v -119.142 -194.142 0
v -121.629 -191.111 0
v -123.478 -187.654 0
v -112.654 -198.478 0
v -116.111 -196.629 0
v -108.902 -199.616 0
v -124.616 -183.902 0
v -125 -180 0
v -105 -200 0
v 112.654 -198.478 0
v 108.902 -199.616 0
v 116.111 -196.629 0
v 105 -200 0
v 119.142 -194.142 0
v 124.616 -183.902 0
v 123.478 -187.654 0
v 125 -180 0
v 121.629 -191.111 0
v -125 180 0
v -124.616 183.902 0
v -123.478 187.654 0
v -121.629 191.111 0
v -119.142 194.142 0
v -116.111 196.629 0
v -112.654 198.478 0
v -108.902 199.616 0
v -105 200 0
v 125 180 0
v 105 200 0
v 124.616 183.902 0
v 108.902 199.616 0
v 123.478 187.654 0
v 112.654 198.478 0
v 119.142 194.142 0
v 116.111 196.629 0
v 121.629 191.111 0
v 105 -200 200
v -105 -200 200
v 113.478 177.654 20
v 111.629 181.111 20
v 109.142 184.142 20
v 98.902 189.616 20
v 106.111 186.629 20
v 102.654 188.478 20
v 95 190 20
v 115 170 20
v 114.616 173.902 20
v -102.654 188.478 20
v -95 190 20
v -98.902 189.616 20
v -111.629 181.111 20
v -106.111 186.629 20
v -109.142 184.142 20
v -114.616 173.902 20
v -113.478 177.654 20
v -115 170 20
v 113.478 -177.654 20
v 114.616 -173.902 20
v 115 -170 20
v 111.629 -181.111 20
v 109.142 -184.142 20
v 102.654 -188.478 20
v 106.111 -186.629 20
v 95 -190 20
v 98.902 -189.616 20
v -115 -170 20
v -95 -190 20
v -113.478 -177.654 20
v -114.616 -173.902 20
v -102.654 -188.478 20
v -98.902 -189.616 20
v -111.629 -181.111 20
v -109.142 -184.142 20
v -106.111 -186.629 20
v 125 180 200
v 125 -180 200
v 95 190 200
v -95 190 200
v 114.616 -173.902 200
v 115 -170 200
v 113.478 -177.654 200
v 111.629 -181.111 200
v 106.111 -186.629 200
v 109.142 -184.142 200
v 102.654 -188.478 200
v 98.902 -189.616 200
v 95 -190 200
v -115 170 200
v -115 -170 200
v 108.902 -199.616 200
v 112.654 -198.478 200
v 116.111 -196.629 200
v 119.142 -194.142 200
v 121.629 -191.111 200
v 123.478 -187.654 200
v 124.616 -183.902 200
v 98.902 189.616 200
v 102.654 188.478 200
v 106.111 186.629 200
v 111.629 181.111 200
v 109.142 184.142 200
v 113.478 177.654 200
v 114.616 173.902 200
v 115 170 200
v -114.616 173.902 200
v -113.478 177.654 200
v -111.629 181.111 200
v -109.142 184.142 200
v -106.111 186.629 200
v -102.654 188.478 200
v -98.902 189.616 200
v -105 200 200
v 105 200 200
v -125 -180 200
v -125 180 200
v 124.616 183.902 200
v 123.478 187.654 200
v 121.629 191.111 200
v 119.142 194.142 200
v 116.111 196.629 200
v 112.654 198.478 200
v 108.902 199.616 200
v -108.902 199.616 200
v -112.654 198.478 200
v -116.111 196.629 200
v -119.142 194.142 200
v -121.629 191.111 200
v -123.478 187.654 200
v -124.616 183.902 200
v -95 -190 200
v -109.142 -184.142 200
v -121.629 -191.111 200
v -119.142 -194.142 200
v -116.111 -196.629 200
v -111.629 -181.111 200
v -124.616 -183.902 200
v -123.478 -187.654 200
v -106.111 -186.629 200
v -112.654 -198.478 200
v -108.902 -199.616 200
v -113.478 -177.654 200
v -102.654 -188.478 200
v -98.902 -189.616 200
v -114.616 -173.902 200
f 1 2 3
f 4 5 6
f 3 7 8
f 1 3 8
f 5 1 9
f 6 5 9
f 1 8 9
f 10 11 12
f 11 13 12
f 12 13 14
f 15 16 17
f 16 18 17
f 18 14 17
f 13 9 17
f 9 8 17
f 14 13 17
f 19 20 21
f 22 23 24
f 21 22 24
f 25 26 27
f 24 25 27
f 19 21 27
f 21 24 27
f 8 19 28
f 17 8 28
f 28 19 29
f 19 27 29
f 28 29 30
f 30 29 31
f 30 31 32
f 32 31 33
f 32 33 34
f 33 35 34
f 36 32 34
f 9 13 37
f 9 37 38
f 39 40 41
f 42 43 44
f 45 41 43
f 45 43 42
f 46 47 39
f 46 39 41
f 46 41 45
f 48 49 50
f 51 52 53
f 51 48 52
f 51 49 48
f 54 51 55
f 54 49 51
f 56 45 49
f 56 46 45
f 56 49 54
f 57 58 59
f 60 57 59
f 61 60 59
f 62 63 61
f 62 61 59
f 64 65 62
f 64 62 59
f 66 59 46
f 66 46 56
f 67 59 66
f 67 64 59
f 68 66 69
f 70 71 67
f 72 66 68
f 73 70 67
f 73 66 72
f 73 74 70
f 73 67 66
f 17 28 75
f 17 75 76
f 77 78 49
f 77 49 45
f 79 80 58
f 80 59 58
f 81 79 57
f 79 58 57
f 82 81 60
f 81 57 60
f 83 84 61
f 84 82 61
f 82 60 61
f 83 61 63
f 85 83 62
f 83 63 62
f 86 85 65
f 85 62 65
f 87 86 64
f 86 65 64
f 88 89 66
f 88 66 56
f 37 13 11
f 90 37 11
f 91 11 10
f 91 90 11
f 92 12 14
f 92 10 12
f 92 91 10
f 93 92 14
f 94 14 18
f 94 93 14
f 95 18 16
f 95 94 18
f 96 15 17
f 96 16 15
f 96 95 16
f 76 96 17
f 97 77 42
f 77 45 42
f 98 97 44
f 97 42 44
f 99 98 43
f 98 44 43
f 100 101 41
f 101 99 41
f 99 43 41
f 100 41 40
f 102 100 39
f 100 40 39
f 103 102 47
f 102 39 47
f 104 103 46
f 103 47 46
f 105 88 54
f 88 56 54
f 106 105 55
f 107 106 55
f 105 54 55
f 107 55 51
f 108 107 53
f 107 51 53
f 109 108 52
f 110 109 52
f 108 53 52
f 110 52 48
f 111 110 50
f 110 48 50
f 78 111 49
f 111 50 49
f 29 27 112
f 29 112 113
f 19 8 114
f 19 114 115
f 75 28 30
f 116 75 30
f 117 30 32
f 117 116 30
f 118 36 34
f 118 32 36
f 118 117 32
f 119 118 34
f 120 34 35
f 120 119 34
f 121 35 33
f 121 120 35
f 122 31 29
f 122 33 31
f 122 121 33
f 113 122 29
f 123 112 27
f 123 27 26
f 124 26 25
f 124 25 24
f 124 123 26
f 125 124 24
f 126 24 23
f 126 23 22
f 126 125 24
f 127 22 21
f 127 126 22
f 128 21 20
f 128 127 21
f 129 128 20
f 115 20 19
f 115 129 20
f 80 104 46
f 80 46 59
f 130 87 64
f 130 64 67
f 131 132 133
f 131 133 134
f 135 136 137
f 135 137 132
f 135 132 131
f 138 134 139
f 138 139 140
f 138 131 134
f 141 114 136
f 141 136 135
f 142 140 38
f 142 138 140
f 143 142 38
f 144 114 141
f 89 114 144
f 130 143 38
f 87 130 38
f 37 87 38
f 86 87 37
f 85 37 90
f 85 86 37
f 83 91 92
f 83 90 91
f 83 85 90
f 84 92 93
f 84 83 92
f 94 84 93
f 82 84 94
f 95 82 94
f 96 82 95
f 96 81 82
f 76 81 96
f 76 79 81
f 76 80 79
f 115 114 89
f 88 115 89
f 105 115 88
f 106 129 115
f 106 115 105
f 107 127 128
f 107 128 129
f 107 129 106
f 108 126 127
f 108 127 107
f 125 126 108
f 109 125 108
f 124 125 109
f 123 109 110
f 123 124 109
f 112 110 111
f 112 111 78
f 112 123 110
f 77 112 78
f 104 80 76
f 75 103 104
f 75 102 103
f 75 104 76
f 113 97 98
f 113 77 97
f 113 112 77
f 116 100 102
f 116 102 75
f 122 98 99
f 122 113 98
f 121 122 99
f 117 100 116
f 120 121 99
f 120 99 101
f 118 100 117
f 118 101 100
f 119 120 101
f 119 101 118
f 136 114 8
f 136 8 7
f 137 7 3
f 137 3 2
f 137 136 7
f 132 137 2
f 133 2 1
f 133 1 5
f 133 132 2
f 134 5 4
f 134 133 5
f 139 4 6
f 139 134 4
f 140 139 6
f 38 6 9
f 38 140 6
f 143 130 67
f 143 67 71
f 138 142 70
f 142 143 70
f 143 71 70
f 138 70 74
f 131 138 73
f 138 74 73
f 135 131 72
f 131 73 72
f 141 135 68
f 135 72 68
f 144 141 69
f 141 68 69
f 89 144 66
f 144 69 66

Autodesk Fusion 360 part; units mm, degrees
sketch "Sketch1" plane through (0, 0, 0) normal (0, 0, 1) x (1, 0, 0)
  line L0 (-125, 200) -> (125, 200)
  line L1 (125, 200) -> (125, -200)
  line L2 (125, -200) -> (-125, -200)
  line L3 (-125, -200) -> (-125, 200)
  dimension "d1" = 250
  dimension "d2" = 400
extrude "Extrude1" add sketch "Sketch1" along normal blind 200
sketch "Sketch2" plane through (0, 0, 200) normal (0, 0, 1) x (-1, 0, 0)
  line L0 (125, 200) -> (-125, 200)
  line L1 (-125, 200) -> (-125, -200)
  line L2 (-125, -200) -> (125, -200)
  line L3 (125, -200) -> (125, 200)
  line L4 (115, -190) -> (-115, -190)
  line L5 (-115, -190) -> (-115, 190)
  line L6 (-115, 190) -> (115, 190)
  line L7 (115, 190) -> (115, -190)
  dimension "d5" = 230
  dimension "d6" = 380
extrude "Extrude2" cut sketch "Sketch2" against normal blind 180 contours L4 L5 L6 L7
fillet "Fillet1" radius 20 4 edges at (-125, -200, 100) (125, -200, 100) (125, 200, 100) (-125, 200, 100)
fillet "Fillet2" radius 20 4 edges at (115, -190, 110) (-115, -190, 110) (115, 190, 110) (-115, 190, 110)
